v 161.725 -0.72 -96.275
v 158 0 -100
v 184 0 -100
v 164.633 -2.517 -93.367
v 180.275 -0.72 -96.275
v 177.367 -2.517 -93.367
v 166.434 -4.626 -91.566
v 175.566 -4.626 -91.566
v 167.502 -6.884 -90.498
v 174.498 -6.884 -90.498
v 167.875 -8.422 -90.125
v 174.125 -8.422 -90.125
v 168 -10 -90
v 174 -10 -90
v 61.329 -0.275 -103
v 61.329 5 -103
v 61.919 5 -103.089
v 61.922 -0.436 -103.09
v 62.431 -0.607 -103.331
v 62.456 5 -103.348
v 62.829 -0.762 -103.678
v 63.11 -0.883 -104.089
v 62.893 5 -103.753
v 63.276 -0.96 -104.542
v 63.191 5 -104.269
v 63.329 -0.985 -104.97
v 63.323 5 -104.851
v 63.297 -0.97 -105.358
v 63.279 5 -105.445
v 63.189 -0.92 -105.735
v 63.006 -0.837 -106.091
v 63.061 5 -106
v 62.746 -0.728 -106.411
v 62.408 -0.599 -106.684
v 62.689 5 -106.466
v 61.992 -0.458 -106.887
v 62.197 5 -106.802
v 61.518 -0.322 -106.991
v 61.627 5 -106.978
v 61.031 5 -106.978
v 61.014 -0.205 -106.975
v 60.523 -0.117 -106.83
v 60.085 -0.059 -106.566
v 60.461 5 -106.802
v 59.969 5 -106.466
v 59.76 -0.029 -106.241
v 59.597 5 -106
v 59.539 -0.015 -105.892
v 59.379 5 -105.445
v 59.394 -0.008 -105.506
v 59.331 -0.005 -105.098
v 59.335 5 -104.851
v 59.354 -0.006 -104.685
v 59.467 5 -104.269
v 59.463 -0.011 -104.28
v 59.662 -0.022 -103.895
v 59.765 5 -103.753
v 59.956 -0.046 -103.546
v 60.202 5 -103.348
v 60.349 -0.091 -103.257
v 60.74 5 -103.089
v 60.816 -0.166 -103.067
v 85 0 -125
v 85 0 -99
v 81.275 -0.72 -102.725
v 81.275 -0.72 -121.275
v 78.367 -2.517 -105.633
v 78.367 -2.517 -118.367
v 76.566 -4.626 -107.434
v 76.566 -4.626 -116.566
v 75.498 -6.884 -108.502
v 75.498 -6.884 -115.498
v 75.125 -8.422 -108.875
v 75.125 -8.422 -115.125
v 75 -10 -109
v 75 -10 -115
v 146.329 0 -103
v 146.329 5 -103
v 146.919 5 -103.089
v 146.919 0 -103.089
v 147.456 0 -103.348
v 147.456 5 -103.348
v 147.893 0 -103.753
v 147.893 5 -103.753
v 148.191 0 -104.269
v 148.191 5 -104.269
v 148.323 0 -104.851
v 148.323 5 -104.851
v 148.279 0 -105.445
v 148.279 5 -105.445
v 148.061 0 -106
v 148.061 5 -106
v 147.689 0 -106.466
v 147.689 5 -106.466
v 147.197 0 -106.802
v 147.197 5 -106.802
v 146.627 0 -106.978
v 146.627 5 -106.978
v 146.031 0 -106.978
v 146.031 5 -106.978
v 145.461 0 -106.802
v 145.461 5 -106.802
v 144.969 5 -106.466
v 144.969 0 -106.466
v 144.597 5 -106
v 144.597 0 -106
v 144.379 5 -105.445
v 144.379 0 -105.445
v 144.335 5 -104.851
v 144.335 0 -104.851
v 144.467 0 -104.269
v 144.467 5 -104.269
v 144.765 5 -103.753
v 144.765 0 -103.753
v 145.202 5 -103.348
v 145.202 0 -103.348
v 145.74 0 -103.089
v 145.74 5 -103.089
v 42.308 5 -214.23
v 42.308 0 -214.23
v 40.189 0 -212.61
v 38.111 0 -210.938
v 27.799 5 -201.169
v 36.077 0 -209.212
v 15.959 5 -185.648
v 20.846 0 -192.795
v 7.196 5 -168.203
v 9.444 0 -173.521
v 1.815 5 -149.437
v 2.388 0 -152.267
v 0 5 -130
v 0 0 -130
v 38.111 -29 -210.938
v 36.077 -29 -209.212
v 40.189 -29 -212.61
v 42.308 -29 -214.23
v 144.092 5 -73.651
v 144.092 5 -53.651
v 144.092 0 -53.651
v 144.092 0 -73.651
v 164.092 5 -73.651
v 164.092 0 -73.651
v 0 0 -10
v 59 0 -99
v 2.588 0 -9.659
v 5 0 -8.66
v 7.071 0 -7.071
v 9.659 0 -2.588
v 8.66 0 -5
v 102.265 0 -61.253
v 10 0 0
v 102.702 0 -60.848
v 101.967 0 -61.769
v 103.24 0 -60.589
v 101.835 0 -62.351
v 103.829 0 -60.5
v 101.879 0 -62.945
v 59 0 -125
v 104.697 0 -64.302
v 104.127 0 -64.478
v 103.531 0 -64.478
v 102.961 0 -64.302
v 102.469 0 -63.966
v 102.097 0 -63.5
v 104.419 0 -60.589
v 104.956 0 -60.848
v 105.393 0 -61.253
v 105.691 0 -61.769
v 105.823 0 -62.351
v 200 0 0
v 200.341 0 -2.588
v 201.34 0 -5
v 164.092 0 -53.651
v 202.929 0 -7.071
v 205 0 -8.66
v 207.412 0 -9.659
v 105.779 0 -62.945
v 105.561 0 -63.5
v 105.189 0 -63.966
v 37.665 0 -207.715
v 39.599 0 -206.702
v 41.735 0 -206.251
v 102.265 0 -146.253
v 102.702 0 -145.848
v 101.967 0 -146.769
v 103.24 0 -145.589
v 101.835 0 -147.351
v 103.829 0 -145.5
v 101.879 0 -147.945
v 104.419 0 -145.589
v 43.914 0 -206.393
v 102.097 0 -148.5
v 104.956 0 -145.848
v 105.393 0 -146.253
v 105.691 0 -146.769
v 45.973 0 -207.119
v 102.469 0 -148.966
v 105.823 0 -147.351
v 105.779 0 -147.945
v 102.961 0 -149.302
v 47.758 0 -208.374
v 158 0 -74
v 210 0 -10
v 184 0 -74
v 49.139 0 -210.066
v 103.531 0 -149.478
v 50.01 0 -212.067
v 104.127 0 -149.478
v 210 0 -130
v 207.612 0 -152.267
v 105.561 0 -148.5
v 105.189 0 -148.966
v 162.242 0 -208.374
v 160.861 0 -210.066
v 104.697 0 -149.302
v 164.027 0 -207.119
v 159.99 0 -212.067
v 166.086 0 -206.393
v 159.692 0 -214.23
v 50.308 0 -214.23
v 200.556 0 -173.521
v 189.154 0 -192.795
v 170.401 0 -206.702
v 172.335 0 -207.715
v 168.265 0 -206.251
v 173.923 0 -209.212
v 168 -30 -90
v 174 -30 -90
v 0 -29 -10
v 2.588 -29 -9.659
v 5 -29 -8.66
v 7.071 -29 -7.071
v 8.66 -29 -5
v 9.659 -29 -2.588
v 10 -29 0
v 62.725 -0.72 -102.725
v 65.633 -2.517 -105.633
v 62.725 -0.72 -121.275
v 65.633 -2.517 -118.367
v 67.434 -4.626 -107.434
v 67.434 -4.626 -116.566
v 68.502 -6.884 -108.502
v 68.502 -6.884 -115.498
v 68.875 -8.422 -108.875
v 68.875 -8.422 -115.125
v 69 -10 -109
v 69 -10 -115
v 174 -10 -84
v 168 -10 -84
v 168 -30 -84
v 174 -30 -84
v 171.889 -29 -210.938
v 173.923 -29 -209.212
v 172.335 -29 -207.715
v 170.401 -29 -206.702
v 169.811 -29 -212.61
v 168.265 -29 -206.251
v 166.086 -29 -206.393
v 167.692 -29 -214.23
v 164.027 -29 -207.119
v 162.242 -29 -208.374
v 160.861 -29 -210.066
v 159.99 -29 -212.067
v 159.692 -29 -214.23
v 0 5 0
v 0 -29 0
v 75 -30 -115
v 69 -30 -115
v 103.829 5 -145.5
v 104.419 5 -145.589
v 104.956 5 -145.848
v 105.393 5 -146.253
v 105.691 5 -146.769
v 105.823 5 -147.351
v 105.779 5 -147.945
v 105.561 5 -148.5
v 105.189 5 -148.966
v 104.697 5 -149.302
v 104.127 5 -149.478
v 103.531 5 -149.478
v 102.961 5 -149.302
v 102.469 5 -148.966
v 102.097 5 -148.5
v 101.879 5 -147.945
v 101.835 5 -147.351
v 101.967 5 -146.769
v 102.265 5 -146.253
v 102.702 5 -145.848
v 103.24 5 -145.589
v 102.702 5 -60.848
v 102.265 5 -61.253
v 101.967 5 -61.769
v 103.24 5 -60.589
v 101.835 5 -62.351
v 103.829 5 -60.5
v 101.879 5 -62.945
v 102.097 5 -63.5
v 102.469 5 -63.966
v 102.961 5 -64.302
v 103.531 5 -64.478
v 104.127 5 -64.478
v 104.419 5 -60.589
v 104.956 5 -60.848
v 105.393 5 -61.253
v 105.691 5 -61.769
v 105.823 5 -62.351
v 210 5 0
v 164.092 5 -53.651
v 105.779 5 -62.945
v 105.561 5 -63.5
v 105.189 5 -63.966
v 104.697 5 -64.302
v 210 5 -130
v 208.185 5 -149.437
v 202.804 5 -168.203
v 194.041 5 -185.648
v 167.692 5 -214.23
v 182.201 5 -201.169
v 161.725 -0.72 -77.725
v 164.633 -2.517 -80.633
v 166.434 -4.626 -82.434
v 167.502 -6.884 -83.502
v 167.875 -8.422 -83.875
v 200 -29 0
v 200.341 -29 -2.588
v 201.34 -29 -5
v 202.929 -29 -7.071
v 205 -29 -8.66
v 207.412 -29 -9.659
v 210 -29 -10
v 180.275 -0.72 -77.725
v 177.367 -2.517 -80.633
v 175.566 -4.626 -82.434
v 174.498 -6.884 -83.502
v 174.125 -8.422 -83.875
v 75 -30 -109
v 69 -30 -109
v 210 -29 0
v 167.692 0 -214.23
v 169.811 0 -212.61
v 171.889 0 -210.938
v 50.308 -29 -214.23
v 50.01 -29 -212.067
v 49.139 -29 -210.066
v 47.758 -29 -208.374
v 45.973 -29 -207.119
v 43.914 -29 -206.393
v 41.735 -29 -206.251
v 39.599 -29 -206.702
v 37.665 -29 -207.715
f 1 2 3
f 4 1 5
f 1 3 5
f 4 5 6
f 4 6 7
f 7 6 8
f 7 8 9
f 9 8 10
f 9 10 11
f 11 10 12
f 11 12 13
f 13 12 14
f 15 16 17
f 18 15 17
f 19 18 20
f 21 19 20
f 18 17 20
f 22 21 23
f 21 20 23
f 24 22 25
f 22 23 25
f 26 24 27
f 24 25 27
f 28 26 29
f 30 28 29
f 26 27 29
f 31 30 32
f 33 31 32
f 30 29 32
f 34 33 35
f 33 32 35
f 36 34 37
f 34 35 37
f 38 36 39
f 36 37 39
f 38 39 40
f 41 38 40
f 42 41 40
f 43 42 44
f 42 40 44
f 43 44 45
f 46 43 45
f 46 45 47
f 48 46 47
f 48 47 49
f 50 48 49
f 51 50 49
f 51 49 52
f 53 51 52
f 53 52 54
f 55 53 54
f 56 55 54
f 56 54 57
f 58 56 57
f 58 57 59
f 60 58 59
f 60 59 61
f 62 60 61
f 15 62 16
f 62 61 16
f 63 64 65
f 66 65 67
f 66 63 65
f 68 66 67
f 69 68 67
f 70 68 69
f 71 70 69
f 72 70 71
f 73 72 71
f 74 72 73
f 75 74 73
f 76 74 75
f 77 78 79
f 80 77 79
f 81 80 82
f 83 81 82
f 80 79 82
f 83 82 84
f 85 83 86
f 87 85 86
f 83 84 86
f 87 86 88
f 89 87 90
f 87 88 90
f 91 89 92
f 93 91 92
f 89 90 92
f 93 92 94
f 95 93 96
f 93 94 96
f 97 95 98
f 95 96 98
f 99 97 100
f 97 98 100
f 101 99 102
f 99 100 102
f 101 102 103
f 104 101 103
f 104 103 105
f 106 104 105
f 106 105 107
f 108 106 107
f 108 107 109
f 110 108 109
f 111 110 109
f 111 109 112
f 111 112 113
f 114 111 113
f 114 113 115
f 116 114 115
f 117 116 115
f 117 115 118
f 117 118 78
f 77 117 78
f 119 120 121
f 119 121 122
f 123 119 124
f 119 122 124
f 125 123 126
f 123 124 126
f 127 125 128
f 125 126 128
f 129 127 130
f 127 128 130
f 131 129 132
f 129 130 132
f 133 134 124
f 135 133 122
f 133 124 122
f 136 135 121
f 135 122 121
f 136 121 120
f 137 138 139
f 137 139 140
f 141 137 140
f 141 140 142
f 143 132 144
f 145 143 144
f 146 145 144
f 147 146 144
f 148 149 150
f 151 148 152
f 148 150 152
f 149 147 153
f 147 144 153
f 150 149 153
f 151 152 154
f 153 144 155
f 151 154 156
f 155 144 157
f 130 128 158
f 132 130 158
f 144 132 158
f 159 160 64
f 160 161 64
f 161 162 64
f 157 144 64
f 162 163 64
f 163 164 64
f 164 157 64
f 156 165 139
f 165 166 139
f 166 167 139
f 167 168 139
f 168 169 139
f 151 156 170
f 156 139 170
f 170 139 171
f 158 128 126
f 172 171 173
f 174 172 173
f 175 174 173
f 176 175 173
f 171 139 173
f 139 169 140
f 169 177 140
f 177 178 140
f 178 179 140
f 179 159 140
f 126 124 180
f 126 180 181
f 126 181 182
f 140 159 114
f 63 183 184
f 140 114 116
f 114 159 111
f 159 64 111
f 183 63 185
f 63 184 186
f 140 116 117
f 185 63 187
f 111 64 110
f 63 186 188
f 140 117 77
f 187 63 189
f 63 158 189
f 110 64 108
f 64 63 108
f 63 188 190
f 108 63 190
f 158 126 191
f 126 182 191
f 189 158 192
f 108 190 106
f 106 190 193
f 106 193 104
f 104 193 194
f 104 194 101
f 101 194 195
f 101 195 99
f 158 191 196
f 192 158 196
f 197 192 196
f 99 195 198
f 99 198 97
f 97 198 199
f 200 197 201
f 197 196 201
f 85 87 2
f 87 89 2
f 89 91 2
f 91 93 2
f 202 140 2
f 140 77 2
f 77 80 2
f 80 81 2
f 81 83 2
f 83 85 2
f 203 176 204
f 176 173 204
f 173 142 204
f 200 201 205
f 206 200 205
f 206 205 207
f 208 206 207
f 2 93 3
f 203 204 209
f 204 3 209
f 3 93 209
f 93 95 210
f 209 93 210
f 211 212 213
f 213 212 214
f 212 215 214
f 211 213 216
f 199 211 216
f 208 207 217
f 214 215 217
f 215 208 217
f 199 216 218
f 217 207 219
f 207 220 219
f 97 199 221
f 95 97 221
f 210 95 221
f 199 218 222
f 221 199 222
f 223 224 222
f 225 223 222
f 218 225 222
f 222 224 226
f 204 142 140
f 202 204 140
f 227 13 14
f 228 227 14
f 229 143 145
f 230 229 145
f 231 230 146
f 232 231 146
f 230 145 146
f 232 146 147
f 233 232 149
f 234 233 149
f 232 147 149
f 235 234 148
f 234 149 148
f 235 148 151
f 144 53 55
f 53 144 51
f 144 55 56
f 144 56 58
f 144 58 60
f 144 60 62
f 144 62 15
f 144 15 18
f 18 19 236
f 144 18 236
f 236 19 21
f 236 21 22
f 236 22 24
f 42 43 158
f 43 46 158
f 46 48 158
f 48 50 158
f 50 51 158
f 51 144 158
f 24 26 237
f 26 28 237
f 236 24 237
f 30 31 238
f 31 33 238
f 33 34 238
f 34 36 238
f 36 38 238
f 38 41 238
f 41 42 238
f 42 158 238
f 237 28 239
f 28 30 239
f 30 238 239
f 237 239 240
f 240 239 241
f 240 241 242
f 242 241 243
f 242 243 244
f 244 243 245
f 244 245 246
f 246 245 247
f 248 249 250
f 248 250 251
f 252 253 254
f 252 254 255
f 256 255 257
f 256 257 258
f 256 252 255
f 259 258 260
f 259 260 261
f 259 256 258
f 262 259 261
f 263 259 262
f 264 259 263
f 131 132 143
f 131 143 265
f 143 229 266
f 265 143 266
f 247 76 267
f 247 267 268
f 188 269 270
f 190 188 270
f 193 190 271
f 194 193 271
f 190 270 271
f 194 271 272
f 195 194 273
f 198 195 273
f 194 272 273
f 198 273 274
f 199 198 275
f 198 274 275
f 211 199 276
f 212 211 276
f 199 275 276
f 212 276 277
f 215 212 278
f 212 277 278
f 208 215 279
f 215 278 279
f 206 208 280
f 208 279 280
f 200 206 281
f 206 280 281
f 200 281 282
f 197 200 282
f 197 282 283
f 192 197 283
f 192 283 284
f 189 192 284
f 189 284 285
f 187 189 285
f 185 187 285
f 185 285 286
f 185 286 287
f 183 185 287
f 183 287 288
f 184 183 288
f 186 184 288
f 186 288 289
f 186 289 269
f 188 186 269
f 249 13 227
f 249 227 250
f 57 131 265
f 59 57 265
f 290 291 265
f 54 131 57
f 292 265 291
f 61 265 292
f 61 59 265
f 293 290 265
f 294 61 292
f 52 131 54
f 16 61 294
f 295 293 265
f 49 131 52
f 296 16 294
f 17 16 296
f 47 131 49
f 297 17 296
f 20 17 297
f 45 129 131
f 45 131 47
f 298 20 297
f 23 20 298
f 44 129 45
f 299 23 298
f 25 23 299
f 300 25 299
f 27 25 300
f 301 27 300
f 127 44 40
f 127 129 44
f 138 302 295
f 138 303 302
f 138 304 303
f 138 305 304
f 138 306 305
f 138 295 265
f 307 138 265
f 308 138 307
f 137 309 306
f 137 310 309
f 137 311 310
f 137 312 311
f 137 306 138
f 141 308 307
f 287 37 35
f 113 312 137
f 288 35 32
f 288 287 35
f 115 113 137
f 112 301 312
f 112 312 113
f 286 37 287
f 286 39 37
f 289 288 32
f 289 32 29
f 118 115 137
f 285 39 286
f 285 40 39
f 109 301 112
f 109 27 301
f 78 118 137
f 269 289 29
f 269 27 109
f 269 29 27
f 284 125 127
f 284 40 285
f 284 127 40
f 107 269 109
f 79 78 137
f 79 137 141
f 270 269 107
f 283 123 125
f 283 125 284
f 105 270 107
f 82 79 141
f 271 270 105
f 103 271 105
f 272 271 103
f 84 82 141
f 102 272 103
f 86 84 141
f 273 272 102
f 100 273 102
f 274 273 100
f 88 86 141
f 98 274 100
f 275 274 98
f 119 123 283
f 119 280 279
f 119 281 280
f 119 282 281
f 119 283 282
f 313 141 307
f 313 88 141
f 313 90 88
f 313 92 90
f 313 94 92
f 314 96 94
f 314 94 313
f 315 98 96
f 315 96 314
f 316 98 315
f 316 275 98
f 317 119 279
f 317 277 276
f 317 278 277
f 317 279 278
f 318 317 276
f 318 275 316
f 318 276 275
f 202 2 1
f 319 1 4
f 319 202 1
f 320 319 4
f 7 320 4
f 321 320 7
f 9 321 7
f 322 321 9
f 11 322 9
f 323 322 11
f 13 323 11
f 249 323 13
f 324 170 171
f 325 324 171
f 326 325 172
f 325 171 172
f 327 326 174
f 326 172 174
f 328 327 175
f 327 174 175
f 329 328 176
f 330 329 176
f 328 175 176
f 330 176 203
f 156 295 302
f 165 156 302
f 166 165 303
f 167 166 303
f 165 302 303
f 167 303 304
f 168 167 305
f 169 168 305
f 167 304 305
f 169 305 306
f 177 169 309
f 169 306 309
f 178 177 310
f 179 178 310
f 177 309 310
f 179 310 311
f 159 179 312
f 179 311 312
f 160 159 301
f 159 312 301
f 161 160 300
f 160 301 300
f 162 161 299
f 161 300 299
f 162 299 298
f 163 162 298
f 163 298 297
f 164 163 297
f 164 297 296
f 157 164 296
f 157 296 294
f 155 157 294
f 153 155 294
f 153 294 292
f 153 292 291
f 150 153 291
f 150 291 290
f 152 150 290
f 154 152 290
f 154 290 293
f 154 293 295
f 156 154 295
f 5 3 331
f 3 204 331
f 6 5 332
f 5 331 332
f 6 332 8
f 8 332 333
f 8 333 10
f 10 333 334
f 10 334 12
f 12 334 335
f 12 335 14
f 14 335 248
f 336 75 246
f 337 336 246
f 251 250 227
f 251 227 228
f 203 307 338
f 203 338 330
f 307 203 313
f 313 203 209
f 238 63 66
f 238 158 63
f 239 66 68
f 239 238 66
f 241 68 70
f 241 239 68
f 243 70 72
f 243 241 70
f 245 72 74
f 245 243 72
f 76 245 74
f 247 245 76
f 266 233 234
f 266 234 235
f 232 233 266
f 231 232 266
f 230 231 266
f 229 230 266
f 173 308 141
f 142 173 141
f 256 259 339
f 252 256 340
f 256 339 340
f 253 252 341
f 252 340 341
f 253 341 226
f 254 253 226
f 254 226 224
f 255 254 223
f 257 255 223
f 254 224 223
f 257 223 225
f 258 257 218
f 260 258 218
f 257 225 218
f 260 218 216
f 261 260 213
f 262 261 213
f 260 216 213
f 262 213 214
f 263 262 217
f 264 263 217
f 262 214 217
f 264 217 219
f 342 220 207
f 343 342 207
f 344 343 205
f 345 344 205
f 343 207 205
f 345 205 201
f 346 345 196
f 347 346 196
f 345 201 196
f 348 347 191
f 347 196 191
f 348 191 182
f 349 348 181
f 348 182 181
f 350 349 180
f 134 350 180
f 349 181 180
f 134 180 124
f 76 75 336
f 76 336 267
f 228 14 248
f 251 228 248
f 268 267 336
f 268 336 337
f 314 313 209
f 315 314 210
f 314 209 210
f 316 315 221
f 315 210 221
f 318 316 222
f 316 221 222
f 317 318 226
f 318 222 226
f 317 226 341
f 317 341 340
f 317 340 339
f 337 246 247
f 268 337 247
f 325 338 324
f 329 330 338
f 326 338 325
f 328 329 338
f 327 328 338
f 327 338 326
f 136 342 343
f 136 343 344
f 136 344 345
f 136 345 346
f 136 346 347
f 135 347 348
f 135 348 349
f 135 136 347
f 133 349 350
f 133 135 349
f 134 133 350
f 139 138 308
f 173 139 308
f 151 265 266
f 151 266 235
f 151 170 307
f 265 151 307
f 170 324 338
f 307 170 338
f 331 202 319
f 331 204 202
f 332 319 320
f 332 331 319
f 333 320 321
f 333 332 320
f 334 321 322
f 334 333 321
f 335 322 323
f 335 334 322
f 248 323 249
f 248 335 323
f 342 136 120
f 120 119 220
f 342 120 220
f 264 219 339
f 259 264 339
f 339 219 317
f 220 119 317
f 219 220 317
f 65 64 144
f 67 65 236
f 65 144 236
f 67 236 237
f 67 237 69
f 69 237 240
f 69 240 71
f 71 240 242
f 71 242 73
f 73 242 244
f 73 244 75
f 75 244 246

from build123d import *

# Parameters (mm, degrees)
BOSS_EXTRUDE1_DEPTH = 5
SKETCH2_W           = 213.862691863
SKETCH2_H           = 54.913039258
CUT_EXTRUDE1_DEPTH  = 5
BOSS_EXTRUDE2_START = 29
BOSS_EXTRUDE2_DEPTH = 29
SKETCH4_W           = 6
SKETCH4_H           = 6
BOSS_EXTRUDE3_DEPTH = 30
SKETCH5_W           = 6
SKETCH5_H           = 6
BOSS_EXTRUDE4_DEPTH = 30
FILLET1_R           = 10
SKETCH7_R           = 2
CUT_EXTRUDE2_DEPTH  = 29
SKETCH8_W           = 20
SKETCH8_H           = 20
CUT_EXTRUDE3_DEPTH  = 10


with BuildPart() as part:
    # Sketch1 → Boss-Extrude1 (new body)
    with BuildSketch(Plane(origin=(0, 0, 0), x_dir=(1, 0, 0), z_dir=(0, 1, 0))):
        with BuildLine():
            Line((0, 130), (0, 0))
            Line((0, 0), (210, 0))
            Line((210, 0), (210, 130))
            ThreePointArc((210, 130), (105, 235), (0, 130))
        make_face()
    extrude(amount=BOSS_EXTRUDE1_DEPTH)

    # Sketch2 → Cut-Extrude1 (cut)
    with BuildSketch(Plane(origin=(0, 5, 0), x_dir=(1, 0, 0), z_dir=(0, 1, 0))):
        with Locations((106.931345932, 241.686519629)):
            Rectangle(SKETCH2_W, SKETCH2_H)
    extrude(amount=-CUT_EXTRUDE1_DEPTH, mode=Mode.SUBTRACT)

    # Sketch3 → Boss-Extrude2 (add)
    with BuildSketch(Plane(origin=(0, 0, 0), x_dir=(-1, 0, 0), z_dir=(0, -1, 0)).offset(BOSS_EXTRUDE2_START)):
        with BuildLine():
            Line((-42.307838608, 214.23), (-50.307838608, 214.23))
            ThreePointArc((-50.307838608, 214.23), (-44.96798765, 206.685226506), (-36.076936839, 209.212444505))
            ThreePointArc((-36.076936839, 209.212444505), (-39.144584131, 211.78058572), (-42.307838608, 214.23))
        make_face()
        with BuildLine():
            ThreePointArc((-173.923063161, 209.212444505), (-165.03201235, 206.685226506), (-159.692161392, 214.23))
            Line((-159.692161392, 214.23), (-167.692161392, 214.23))
            ThreePointArc((-167.692161392, 214.23), (-170.855415869, 211.78058572), (-173.923063161, 209.212444505))
        make_face()
        with BuildLine():
            Line((0, 0), (0, 10))
            ThreePointArc((0, 10), (-7.071067812, 7.071067812), (-10, 0))
            Line((-10, 0), (0, 0))
        make_face()
        with BuildLine():
            ThreePointArc((-200, 0), (-202.928932188, 7.071067812), (-210, 10))
            Line((-210, 10), (-210, 0))
            Line((-210, 0), (-200, 0))
        make_face()
    extrude(amount=-BOSS_EXTRUDE2_DEPTH)

    # Sketch4 → Boss-Extrude3 (add)
    with BuildSketch(Plane.XZ):
        with Locations((171, -87)):
            Rectangle(SKETCH4_W, SKETCH4_H)
    extrude(amount=BOSS_EXTRUDE3_DEPTH)

    # Sketch5 → Boss-Extrude4 (add)
    with BuildSketch(Plane(origin=(0, 0, 0), x_dir=(-1, 0, 0), z_dir=(0, -1, 0))):
        with Locations((-72, 112)):
            Rectangle(SKETCH5_W, SKETCH5_H)
    extrude(amount=BOSS_EXTRUDE4_DEPTH)

    # Fillet1
    fillet1_edges = [part.edges().sort_by_distance(p)[0] for p in [
        (171, 0, -84),
        (168, 0, -87),
        (174, 0, -87),
        (171, 0, -90),
        (72, 0, -109),
        (69, 0, -112),
        (72, 0, -115),
        (75, 0, -112),
    ]]
    fillet(fillet1_edges, radius=FILLET1_R)

    # Sketch7 → Cut-Extrude2 (cut)
    with BuildSketch(Plane(origin=(0, 5, 0), x_dir=(1, 0, 0), z_dir=(0, 1, 0))):
        with Locations((103.829013771, 147.5)):
            Circle(SKETCH7_R)
        with Locations((146.329013771, 105)):
            Circle(SKETCH7_R)
        with Locations((103.829013771, 62.5)):
            Circle(SKETCH7_R)
        with Locations((61.329013771, 105)):
            Circle(SKETCH7_R)
    extrude(amount=-CUT_EXTRUDE2_DEPTH, mode=Mode.SUBTRACT)

    # Sketch8 → Cut-Extrude3 (cut)
    with BuildSketch(Plane(origin=(0, 5, 0), x_dir=(1, 0, 0), z_dir=(0, 1, 0))):
        with Locations((154.091797389, 63.651218277)):
            Rectangle(SKETCH8_W, SKETCH8_H)
    extrude(amount=-CUT_EXTRUDE3_DEPTH, mode=Mode.SUBTRACT)


solid = part.part
